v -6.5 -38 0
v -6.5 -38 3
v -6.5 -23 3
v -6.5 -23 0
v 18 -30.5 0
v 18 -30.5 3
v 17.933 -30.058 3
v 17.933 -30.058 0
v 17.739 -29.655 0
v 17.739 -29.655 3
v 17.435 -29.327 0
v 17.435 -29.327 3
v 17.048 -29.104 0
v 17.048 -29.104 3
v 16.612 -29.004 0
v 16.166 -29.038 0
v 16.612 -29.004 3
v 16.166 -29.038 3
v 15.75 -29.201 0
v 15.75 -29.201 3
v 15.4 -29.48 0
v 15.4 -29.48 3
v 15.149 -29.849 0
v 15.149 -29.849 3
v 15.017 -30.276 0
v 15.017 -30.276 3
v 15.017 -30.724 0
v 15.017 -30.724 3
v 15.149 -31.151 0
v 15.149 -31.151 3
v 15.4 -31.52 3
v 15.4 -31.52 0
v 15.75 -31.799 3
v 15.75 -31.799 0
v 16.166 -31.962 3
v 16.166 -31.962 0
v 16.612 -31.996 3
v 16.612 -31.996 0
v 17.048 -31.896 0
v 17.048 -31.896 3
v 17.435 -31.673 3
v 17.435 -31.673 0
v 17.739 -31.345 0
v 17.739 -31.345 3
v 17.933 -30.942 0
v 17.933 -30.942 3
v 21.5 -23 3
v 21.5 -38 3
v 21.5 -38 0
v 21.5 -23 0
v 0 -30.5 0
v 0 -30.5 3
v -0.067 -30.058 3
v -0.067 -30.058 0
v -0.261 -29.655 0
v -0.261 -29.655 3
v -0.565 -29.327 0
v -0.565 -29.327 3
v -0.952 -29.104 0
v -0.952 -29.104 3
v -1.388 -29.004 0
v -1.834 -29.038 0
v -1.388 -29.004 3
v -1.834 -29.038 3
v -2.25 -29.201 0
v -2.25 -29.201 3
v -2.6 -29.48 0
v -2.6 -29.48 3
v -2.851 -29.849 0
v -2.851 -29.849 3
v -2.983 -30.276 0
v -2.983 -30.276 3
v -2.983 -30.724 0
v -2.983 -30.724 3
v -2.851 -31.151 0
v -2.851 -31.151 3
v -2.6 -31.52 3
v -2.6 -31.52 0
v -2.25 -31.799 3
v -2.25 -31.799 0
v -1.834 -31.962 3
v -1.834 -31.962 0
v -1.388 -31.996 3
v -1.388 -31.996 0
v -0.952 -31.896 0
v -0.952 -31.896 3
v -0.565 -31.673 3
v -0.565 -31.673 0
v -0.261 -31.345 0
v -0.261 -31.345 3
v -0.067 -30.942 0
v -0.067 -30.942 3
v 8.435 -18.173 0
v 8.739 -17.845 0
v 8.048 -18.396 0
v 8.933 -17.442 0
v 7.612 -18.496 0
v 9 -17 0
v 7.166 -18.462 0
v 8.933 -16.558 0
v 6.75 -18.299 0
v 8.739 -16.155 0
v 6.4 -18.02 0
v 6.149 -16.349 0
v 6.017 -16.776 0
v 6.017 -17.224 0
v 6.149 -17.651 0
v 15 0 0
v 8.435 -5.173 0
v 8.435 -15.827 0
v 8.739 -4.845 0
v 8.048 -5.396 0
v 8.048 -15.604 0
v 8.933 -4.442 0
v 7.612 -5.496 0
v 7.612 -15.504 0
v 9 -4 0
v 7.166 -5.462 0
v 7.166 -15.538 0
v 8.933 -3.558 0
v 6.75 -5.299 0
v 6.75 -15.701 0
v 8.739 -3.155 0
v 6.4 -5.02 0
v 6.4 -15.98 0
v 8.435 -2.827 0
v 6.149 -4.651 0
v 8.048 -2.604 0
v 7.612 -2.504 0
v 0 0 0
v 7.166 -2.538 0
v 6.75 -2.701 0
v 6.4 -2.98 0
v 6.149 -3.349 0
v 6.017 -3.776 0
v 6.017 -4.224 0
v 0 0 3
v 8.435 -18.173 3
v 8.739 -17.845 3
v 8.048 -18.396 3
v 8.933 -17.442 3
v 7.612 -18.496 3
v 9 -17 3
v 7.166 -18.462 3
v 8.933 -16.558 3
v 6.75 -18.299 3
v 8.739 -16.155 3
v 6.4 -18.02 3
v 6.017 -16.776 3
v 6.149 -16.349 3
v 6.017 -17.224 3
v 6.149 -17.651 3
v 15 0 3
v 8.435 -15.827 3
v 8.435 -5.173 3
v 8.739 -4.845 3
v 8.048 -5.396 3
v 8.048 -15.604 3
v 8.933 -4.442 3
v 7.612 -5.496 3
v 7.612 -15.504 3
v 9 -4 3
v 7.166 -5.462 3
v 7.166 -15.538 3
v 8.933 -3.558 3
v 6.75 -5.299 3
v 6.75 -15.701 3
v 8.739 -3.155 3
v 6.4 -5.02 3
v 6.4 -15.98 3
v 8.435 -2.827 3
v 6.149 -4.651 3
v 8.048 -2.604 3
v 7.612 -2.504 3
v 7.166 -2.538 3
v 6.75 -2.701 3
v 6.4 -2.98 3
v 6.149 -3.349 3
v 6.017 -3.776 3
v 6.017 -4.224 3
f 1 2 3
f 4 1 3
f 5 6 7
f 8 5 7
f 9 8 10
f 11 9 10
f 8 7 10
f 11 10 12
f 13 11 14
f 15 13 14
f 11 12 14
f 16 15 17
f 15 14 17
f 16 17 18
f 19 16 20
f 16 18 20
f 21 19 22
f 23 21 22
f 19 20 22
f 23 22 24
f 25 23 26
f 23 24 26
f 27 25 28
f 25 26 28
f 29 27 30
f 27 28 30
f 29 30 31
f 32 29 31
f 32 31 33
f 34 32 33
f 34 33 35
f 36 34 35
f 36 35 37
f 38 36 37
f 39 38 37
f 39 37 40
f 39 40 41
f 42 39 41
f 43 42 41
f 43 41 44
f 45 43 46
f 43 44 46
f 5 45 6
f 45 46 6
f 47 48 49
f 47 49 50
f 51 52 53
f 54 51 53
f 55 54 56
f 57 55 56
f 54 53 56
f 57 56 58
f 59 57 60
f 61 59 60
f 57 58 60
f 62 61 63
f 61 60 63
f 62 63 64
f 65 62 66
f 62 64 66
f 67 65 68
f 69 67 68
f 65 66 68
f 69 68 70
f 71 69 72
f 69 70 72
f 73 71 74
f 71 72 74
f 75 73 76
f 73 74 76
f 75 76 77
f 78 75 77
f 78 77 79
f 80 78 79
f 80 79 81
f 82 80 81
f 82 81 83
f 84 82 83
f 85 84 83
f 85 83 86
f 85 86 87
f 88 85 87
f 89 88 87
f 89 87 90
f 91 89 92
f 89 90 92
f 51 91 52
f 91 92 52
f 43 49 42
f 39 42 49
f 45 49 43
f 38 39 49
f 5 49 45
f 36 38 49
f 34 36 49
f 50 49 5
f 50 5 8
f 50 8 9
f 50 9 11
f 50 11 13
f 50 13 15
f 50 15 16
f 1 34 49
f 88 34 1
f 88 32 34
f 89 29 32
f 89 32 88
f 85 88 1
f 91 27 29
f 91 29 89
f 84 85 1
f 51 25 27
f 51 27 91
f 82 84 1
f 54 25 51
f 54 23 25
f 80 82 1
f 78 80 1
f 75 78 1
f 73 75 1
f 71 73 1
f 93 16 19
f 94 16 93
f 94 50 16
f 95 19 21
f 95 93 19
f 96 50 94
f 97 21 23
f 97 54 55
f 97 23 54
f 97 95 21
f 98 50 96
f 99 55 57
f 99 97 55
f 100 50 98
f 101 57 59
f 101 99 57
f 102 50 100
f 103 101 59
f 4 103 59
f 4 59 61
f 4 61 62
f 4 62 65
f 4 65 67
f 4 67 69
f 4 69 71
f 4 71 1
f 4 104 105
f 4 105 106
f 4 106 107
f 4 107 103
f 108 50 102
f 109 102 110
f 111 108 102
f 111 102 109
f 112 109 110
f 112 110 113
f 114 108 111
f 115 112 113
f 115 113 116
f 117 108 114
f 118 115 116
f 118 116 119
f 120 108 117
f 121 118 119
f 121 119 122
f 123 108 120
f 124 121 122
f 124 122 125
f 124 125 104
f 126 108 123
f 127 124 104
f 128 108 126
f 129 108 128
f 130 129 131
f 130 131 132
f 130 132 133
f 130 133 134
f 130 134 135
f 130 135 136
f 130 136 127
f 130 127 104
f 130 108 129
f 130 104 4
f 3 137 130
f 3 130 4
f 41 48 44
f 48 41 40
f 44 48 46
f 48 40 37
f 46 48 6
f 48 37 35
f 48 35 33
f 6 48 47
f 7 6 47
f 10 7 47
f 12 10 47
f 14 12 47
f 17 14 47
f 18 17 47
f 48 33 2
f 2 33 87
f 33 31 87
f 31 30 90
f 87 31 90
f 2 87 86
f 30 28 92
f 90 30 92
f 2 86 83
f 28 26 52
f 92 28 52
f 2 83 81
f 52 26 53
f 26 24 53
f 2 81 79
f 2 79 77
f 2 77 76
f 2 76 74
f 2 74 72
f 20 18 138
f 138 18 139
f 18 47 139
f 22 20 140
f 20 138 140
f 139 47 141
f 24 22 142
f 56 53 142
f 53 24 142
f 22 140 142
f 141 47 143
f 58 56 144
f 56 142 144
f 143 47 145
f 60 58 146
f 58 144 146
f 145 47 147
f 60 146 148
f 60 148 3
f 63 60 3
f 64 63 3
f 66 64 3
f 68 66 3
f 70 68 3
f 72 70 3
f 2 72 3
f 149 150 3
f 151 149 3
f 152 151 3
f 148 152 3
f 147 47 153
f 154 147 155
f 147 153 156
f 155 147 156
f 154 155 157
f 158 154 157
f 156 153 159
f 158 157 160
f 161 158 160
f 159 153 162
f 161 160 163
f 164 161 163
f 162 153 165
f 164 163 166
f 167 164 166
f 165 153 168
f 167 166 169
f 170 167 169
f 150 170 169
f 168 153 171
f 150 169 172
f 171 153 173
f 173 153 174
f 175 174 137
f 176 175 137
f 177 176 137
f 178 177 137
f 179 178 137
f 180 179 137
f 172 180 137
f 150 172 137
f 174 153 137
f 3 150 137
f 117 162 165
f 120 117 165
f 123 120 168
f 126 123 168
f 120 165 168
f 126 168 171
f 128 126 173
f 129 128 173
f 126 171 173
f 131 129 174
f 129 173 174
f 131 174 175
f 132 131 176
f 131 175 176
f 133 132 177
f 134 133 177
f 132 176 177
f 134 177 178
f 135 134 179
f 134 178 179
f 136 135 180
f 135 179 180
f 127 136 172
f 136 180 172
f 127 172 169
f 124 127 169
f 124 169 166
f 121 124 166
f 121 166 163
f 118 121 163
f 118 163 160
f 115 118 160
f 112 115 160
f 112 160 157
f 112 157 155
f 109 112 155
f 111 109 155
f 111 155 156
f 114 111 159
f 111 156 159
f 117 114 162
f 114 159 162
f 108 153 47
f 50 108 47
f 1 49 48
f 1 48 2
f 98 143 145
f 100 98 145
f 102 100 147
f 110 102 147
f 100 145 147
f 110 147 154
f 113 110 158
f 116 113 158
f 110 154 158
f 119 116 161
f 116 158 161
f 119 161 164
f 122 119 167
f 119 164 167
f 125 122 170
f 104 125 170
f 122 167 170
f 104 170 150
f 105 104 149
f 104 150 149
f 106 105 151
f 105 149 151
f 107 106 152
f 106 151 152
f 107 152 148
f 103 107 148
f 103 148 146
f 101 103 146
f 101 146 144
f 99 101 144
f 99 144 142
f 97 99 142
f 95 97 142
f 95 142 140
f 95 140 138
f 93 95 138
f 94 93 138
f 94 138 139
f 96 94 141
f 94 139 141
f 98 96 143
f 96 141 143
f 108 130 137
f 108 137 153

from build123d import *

# Parameters (mm, degrees)
EXTRUDE_1_DEPTH     = 3
SKETCH_2_R          = 1.5
CUT_EXTRUDE_1_DEPTH = 3
SKETCH_3_W          = 11
SKETCH_3_H          = 29.457142857
CUT_EXTRUDE_2_DEPTH = 3
SKETCH_4_W          = 11
SKETCH_4_H          = 29.457142857
CUT_EXTRUDE_3_DEPTH = 3
CUT_EXTRUDE_4_DEPTH = 3


with BuildPart() as part:
    # 草图1 → 凸台-拉伸1 (new body)
    with BuildSketch(Plane.XY):
        Polygon((0, 0), (15, 0), (32.5, -23), (32.5, -38), (-17.5, -38), (-17.5, -23), align=None)
    extrude(amount=EXTRUDE_1_DEPTH)

    # 草图2 → 切除-拉伸1 (cut)
    with BuildSketch(Plane.XY.offset(3)):
        with Locations((7.5, -4)):
            Circle(SKETCH_2_R)
        with Locations((7.5, -17)):
            Circle(SKETCH_2_R)
        with Locations((28.5, -30.5)):
            Circle(SKETCH_2_R)
        with Locations((16.5, -30.5)):
            Circle(SKETCH_2_R)
        with Locations((-1.5, -30.5)):
            Circle(SKETCH_2_R)
        with Locations((-13.5, -30.5)):
            Circle(SKETCH_2_R)
    extrude(amount=-CUT_EXTRUDE_1_DEPTH, mode=Mode.SUBTRACT)

    # 草图3 → 切除-拉伸2 (cut)
    with BuildSketch(Plane.XY.offset(3)):
        with Locations((27, -23.271428571)):
            Rectangle(SKETCH_3_W, SKETCH_3_H)
    extrude(amount=-CUT_EXTRUDE_2_DEPTH, mode=Mode.SUBTRACT)

    # 草图4 → 切除-拉伸3 (cut)
    with BuildSketch(Plane.XY.offset(3)):
        with Locations((-12, -23.271428571)):
            Rectangle(SKETCH_4_W, SKETCH_4_H)
    extrude(amount=-CUT_EXTRUDE_3_DEPTH, mode=Mode.SUBTRACT)

    # 草图5 → 切除-拉伸4 (cut)
    with BuildSketch(Plane.XY.offset(3)):
        Polygon((-6.5, -23), (-6.5, -8.542857143), (0, 0), align=None)
        Polygon((21.5, -23), (21.5, -8.542857143), (15, 0), align=None)
    extrude(amount=-CUT_EXTRUDE_4_DEPTH, mode=Mode.SUBTRACT)


solid = part.part
